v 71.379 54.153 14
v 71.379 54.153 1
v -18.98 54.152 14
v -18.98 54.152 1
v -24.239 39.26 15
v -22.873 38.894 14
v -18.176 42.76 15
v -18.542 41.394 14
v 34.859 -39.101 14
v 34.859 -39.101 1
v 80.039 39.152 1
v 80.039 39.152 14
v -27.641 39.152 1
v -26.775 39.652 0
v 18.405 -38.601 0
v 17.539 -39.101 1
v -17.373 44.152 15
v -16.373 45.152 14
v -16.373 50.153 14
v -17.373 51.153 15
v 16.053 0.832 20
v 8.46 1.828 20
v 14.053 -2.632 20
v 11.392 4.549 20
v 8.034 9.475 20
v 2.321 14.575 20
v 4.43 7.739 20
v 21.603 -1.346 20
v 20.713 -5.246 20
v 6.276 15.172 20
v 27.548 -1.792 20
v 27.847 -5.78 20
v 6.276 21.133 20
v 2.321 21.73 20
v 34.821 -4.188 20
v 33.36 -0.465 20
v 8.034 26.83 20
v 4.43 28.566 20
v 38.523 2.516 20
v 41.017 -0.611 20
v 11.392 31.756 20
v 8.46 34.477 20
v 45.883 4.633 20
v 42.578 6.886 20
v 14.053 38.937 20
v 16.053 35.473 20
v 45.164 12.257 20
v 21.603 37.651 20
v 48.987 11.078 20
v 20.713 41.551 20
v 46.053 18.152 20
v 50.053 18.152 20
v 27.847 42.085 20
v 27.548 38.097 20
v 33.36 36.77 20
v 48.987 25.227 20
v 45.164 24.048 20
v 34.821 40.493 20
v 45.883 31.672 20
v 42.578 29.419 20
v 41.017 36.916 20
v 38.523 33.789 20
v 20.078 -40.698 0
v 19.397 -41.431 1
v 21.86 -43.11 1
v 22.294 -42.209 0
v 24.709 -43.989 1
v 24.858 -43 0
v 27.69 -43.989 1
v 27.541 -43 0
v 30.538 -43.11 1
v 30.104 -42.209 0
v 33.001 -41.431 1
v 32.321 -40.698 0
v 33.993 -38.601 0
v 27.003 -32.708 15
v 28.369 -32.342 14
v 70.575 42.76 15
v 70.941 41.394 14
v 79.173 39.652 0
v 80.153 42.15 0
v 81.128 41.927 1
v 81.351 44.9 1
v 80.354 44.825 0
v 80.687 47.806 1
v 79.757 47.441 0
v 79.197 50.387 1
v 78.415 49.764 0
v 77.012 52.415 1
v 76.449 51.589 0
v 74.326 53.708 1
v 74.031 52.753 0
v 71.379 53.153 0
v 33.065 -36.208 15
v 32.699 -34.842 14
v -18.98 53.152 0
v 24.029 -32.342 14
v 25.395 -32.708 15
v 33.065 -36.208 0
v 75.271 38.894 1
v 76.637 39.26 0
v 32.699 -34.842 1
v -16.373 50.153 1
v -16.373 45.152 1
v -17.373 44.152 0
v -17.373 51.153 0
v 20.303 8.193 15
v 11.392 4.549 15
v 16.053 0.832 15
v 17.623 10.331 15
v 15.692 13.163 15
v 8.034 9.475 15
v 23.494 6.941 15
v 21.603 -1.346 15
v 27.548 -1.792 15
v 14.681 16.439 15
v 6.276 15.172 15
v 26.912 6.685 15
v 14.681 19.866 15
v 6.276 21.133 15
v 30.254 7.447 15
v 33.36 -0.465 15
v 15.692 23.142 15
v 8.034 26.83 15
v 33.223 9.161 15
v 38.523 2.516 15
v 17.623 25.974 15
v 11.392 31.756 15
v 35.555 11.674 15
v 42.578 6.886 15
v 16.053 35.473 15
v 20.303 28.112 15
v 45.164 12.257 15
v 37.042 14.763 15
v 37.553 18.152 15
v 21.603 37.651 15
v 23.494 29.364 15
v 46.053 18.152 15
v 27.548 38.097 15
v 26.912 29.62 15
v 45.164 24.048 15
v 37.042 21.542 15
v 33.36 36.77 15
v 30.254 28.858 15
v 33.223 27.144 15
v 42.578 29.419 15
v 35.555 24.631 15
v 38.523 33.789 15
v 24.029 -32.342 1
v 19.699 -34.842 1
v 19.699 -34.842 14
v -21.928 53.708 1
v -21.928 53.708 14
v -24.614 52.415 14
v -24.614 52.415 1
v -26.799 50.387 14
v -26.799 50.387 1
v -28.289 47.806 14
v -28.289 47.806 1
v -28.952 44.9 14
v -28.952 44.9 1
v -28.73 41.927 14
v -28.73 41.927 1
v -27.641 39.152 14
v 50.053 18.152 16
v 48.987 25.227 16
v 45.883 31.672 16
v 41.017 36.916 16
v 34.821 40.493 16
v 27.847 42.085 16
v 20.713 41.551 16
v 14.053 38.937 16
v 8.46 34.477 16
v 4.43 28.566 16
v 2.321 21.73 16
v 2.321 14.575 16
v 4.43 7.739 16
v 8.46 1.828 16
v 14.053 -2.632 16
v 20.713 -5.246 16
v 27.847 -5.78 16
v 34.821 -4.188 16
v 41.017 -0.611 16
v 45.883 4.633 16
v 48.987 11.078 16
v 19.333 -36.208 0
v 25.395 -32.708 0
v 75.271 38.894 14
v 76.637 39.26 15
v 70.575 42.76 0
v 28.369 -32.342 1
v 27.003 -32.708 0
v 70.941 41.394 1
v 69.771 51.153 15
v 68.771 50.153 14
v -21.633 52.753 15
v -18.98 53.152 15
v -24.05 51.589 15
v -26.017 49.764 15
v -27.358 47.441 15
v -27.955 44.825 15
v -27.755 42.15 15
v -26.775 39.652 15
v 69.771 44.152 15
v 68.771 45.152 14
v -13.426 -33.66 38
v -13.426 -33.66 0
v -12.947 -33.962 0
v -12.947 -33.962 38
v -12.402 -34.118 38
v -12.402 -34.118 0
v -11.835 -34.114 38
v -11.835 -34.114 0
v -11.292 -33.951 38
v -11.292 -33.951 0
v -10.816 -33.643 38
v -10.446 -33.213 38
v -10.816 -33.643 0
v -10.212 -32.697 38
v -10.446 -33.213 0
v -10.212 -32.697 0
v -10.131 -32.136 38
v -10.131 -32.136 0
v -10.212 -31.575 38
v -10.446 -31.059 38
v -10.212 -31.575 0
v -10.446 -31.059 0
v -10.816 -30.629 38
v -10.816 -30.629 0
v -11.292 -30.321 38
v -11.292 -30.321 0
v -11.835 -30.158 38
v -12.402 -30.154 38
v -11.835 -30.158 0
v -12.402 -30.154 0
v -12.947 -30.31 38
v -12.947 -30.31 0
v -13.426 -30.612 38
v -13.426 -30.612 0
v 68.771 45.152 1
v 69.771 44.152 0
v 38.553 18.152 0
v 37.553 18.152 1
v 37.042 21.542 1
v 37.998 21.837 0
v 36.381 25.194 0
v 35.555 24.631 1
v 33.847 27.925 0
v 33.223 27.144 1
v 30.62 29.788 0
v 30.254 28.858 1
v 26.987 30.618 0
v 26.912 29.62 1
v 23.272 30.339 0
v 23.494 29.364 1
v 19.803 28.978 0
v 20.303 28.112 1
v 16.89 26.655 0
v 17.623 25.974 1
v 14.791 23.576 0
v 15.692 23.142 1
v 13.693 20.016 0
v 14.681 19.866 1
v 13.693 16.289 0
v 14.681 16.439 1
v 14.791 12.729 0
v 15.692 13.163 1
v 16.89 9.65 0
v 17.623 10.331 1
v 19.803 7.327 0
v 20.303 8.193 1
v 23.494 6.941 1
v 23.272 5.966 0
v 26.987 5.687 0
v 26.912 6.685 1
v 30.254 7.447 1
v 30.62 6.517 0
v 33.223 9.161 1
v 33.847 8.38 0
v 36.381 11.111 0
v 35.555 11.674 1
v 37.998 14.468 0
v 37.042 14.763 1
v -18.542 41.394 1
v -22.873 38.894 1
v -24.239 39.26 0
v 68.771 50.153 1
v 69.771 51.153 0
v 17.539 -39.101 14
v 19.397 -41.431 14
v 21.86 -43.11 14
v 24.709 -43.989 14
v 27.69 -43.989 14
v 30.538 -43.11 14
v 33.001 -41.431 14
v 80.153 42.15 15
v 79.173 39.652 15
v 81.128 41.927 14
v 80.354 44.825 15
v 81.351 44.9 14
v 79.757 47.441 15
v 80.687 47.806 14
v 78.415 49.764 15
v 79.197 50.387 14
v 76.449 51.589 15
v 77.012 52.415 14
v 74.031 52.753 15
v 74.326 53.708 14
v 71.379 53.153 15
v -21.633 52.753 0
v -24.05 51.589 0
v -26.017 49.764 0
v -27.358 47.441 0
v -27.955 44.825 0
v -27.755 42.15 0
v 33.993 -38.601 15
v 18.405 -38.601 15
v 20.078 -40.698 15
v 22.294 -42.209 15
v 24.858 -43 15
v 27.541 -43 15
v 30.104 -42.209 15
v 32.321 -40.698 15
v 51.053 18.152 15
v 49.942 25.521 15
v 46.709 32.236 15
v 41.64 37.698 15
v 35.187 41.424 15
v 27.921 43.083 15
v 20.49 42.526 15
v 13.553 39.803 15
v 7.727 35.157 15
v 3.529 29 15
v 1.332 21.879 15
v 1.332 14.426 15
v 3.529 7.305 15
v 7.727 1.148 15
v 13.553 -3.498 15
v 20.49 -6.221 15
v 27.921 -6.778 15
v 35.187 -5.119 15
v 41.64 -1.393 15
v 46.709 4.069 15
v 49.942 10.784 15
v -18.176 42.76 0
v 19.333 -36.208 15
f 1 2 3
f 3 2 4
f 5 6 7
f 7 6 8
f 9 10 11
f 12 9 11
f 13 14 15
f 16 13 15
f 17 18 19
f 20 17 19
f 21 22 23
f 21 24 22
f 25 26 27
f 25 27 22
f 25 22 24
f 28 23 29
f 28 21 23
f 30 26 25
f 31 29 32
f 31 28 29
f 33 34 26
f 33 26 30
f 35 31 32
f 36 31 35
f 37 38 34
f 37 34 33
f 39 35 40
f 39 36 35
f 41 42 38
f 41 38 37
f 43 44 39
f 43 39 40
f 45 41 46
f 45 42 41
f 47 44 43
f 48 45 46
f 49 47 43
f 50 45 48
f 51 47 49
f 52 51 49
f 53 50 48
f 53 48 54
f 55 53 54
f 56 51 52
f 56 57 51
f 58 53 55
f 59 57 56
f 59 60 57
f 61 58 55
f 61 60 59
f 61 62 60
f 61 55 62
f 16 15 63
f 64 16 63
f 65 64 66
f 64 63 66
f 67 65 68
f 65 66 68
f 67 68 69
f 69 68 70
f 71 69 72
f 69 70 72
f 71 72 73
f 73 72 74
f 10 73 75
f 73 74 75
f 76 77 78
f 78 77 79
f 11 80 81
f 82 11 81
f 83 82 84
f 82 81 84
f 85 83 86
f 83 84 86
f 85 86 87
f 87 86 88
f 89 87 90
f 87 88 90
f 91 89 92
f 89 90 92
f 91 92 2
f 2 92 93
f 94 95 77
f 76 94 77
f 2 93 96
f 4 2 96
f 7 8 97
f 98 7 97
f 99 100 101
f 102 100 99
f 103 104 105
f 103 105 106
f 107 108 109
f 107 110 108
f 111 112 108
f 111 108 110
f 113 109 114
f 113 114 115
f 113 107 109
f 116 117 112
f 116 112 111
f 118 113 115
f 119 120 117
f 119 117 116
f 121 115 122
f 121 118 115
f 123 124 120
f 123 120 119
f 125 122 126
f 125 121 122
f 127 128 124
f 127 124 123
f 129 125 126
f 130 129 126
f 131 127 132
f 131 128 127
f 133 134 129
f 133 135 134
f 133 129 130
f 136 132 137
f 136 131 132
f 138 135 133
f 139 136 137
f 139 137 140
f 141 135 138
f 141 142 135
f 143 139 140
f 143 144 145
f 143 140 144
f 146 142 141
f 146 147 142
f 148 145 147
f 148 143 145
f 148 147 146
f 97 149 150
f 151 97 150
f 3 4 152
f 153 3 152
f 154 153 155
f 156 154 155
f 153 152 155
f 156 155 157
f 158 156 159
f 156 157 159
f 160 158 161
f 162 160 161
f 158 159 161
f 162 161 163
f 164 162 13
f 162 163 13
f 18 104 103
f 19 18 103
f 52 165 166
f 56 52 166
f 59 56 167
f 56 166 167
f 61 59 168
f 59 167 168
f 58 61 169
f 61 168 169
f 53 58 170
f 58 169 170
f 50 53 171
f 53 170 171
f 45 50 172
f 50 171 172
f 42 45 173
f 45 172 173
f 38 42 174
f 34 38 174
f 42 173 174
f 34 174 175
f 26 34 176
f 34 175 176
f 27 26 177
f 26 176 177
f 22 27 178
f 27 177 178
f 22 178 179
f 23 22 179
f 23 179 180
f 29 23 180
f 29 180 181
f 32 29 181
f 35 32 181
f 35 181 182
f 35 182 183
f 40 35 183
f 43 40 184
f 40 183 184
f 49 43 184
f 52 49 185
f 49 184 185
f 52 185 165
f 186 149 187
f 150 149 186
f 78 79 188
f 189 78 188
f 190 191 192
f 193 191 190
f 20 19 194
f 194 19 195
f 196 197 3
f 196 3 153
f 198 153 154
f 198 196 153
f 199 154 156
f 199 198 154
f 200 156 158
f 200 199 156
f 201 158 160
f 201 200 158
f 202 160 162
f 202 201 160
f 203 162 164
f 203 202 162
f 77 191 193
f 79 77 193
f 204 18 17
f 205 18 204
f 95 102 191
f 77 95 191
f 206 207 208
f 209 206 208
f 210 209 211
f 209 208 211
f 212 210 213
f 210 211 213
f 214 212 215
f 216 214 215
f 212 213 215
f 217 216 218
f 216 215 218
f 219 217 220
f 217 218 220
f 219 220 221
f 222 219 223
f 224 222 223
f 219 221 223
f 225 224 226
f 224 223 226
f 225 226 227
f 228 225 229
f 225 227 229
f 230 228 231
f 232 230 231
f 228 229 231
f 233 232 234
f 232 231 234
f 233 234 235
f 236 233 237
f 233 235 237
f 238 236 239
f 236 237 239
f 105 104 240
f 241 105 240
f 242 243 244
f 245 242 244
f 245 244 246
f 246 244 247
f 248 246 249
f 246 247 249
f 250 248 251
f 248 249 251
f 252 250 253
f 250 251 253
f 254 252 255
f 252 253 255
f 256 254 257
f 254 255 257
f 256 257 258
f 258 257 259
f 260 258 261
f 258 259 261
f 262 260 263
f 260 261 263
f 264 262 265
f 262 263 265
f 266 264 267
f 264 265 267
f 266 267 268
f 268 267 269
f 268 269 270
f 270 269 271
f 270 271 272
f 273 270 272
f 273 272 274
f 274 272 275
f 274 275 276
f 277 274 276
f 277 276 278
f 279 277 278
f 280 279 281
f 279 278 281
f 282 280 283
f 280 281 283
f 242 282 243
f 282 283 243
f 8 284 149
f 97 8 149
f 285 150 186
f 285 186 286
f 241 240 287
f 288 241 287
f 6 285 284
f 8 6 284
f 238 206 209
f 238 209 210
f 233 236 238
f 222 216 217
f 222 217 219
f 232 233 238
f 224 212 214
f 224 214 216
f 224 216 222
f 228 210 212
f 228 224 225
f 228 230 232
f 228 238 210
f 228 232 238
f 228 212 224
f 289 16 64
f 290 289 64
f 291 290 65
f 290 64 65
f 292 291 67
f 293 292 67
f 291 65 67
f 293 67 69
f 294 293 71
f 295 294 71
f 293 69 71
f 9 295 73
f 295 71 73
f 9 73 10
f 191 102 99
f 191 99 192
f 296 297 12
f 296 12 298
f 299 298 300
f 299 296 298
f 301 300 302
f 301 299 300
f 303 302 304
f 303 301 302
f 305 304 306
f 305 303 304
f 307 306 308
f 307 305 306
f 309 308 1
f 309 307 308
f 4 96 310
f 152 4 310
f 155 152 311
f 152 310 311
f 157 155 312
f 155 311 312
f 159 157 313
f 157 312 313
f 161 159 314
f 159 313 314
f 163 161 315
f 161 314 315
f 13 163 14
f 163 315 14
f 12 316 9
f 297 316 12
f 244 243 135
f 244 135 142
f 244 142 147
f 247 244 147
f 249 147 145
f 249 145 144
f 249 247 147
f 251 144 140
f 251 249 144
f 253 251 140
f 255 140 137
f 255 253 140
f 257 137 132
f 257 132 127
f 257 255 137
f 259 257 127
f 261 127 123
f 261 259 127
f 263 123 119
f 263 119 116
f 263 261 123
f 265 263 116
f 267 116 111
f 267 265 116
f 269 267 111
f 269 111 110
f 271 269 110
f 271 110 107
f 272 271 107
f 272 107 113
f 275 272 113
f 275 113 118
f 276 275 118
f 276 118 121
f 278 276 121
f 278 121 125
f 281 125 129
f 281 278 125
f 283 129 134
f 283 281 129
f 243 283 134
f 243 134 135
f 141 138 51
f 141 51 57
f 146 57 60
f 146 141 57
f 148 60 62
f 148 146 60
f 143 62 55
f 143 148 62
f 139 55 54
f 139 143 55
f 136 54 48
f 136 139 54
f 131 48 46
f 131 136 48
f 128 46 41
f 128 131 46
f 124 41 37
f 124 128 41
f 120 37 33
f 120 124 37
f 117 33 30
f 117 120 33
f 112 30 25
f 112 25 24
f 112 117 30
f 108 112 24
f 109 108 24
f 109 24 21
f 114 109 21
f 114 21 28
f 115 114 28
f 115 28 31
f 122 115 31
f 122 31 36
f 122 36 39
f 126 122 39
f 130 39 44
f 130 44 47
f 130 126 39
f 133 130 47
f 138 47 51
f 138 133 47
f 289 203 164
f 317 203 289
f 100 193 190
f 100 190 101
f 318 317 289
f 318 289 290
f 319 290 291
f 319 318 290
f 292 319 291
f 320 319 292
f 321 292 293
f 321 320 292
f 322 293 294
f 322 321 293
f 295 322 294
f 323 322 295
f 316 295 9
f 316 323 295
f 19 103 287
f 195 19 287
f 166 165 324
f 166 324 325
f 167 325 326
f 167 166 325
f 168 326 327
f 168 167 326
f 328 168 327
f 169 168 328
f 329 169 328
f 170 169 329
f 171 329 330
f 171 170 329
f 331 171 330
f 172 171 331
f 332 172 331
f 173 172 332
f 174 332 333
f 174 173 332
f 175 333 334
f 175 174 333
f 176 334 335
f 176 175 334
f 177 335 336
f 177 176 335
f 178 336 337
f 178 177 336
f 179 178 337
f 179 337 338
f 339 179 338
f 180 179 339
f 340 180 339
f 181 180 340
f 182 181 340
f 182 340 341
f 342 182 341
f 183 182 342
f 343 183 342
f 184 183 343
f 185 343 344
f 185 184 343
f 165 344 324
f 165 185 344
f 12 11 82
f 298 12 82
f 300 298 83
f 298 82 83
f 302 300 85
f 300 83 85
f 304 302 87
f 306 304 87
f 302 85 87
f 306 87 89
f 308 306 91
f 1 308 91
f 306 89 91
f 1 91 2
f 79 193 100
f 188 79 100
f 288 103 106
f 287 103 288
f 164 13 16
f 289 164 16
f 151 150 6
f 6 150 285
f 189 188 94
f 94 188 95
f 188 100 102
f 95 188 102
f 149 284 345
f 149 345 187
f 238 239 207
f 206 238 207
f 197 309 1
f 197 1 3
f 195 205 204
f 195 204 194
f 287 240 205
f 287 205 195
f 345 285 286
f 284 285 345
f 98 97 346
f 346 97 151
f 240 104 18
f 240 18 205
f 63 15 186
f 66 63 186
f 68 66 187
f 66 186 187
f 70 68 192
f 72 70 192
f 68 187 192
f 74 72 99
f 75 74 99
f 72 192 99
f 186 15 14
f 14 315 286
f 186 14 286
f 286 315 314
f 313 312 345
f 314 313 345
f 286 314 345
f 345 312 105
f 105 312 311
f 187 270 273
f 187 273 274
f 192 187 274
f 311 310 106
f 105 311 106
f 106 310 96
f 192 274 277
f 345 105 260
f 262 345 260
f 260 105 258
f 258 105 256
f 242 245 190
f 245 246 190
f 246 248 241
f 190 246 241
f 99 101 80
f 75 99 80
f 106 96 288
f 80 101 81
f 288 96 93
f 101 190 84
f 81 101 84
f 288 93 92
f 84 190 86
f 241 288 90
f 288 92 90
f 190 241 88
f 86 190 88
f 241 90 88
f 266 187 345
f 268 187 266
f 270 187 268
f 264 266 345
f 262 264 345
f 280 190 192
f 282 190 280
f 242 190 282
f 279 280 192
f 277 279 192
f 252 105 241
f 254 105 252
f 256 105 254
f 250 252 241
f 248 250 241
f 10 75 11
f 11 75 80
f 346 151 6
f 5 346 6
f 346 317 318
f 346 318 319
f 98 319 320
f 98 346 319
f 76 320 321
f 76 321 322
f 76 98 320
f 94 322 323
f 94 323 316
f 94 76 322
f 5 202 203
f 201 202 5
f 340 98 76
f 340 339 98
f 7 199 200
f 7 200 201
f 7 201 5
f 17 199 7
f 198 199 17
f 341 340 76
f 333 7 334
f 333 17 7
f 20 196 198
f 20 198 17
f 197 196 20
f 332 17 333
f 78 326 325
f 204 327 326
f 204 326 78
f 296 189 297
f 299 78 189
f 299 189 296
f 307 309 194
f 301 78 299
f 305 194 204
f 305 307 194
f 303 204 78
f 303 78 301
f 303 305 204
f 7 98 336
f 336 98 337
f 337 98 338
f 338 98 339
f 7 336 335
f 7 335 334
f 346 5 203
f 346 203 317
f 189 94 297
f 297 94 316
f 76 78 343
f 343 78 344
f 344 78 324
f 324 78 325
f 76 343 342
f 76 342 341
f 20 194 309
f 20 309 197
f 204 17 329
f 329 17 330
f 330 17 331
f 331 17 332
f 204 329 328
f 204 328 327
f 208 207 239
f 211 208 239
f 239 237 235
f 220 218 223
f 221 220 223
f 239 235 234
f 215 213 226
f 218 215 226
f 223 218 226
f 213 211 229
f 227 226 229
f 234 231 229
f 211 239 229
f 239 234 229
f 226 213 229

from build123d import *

# Parameters (mm, degrees)
F0_R     = 11.5
F0_W     = 85.143594
F0_H     = 5
F1_DEPTH = 15
F2_R     = 24
F2_R_2   = 20
F3_DEPTH = 5
F4_SIZE  = 1
F5_SIZE  = 1
F7_DEPTH = 38


with BuildPart() as f1:
    # F0 (on Top) → F1 (new body)
    with BuildSketch(Plane.XY):
        with BuildLine():
            Line((71.378684, 54.1525), (-18.9803, 54.1525))
            ThreePointArc((-18.9803, 54.1525), (-27.640554, 49.1525), (-27.640554, 39.1525))
            Line((-27.640554, 39.1525), (17.538938, -39.100676))
            ThreePointArc((17.538938, -39.100676), (26.199192, -44.100676), (34.859446, -39.100676))
            Line((34.859446, -39.100676), (80.038938, 39.1525))
            ThreePointArc((80.038938, 39.1525), (80.038938, 49.1525), (71.378684, 54.1525))
        make_face()
        Polygon((19.699192, -34.842345), (-22.872605, 38.89417), (-18.542478, 41.39417), (24.029319, -32.342345), align=None, mode=Mode.SUBTRACT)
        Polygon((75.270989, 38.89417), (32.699192, -34.842345), (28.369065, -32.342345), (70.940862, 41.39417), align=None, mode=Mode.SUBTRACT)
        with Locations((26.053021, 18.1525)):
            Circle(F0_R, mode=Mode.SUBTRACT)
        with Locations((26.199192, 47.6525)):
            Rectangle(F0_W, F0_H, mode=Mode.SUBTRACT)
    extrude(amount=F1_DEPTH)

    # F2 (on face) → F3 (join)
    with BuildSketch(Plane.XY.offset(15)):
        with Locations((26.053021, 18.1525)):
            Circle(F2_R)
        with Locations((26.053021, 18.1525)):
            Circle(F2_R_2, mode=Mode.SUBTRACT)
    extrude(amount=F3_DEPTH)

    # F4
    f4_edges = [f1.edges().sort_by_distance(p)[0] for p in [
        (80.038938, 49.1525, 15),
        (57.449192, 0.025912, 15),
        (26.199192, 54.1525, 15),
        (26.199192, -44.100676, 15),
        (-27.640554, 49.1525, 15),
        (-5.050808, 0.025912, 15),
        (2.74342, 4.525912, 15),
        (-20.707541, 40.14417, 15),
        (21.864255, -33.592345, 15),
        (-1.586707, 2.025912, 15),
        (73.105925, 40.14417, 15),
        (49.654963, 4.525912, 15),
        (53.98509, 2.025912, 15),
        (30.534128, -33.592345, 15),
        (2.053021, 18.1525, 15),
        (26.199192, 50.1525, 15),
        (-16.372605, 47.6525, 15),
        (68.770989, 47.6525, 15),
        (26.199192, 45.1525, 15),
    ]]
    chamfer(f4_edges, length=F4_SIZE)

    # F5
    f5_edges = [f1.edges().sort_by_distance(p)[0] for p in [
        (80.038938, 49.1525, 0),
        (26.199192, 54.1525, 0),
        (-27.640554, 49.1525, 0),
        (-5.050808, 0.025912, 0),
        (26.199192, -44.100676, 0),
        (57.449192, 0.025912, 0),
        (2.74342, 4.525912, 0),
        (21.864255, -33.592345, 0),
        (-1.586707, 2.025912, 0),
        (-20.707541, 40.14417, 0),
        (73.105925, 40.14417, 0),
        (53.98509, 2.025912, 0),
        (30.534128, -33.592345, 0),
        (49.654963, 4.525912, 0),
        (14.553021, 18.1525, 0),
        (26.199192, 50.1525, 0),
        (68.770989, 47.6525, 0),
        (26.199192, 45.1525, 0),
        (-16.372605, 47.6525, 0),
    ]]
    chamfer(f5_edges, length=F5_SIZE)


with BuildPart() as f7:
    # F6 (on Top) → F7 (new body)
    with BuildSketch(Plane.XY):
        with BuildLine():
            Line((-13.426415, -30.612005), (-13.426415, -33.659841))
            ThreePointArc((-13.426415, -33.659841), (-10.131165, -32.135923), (-13.426415, -30.612005))
        make_face()
    extrude(amount=F7_DEPTH)


solid = Compound([f1.part, f7.part])
